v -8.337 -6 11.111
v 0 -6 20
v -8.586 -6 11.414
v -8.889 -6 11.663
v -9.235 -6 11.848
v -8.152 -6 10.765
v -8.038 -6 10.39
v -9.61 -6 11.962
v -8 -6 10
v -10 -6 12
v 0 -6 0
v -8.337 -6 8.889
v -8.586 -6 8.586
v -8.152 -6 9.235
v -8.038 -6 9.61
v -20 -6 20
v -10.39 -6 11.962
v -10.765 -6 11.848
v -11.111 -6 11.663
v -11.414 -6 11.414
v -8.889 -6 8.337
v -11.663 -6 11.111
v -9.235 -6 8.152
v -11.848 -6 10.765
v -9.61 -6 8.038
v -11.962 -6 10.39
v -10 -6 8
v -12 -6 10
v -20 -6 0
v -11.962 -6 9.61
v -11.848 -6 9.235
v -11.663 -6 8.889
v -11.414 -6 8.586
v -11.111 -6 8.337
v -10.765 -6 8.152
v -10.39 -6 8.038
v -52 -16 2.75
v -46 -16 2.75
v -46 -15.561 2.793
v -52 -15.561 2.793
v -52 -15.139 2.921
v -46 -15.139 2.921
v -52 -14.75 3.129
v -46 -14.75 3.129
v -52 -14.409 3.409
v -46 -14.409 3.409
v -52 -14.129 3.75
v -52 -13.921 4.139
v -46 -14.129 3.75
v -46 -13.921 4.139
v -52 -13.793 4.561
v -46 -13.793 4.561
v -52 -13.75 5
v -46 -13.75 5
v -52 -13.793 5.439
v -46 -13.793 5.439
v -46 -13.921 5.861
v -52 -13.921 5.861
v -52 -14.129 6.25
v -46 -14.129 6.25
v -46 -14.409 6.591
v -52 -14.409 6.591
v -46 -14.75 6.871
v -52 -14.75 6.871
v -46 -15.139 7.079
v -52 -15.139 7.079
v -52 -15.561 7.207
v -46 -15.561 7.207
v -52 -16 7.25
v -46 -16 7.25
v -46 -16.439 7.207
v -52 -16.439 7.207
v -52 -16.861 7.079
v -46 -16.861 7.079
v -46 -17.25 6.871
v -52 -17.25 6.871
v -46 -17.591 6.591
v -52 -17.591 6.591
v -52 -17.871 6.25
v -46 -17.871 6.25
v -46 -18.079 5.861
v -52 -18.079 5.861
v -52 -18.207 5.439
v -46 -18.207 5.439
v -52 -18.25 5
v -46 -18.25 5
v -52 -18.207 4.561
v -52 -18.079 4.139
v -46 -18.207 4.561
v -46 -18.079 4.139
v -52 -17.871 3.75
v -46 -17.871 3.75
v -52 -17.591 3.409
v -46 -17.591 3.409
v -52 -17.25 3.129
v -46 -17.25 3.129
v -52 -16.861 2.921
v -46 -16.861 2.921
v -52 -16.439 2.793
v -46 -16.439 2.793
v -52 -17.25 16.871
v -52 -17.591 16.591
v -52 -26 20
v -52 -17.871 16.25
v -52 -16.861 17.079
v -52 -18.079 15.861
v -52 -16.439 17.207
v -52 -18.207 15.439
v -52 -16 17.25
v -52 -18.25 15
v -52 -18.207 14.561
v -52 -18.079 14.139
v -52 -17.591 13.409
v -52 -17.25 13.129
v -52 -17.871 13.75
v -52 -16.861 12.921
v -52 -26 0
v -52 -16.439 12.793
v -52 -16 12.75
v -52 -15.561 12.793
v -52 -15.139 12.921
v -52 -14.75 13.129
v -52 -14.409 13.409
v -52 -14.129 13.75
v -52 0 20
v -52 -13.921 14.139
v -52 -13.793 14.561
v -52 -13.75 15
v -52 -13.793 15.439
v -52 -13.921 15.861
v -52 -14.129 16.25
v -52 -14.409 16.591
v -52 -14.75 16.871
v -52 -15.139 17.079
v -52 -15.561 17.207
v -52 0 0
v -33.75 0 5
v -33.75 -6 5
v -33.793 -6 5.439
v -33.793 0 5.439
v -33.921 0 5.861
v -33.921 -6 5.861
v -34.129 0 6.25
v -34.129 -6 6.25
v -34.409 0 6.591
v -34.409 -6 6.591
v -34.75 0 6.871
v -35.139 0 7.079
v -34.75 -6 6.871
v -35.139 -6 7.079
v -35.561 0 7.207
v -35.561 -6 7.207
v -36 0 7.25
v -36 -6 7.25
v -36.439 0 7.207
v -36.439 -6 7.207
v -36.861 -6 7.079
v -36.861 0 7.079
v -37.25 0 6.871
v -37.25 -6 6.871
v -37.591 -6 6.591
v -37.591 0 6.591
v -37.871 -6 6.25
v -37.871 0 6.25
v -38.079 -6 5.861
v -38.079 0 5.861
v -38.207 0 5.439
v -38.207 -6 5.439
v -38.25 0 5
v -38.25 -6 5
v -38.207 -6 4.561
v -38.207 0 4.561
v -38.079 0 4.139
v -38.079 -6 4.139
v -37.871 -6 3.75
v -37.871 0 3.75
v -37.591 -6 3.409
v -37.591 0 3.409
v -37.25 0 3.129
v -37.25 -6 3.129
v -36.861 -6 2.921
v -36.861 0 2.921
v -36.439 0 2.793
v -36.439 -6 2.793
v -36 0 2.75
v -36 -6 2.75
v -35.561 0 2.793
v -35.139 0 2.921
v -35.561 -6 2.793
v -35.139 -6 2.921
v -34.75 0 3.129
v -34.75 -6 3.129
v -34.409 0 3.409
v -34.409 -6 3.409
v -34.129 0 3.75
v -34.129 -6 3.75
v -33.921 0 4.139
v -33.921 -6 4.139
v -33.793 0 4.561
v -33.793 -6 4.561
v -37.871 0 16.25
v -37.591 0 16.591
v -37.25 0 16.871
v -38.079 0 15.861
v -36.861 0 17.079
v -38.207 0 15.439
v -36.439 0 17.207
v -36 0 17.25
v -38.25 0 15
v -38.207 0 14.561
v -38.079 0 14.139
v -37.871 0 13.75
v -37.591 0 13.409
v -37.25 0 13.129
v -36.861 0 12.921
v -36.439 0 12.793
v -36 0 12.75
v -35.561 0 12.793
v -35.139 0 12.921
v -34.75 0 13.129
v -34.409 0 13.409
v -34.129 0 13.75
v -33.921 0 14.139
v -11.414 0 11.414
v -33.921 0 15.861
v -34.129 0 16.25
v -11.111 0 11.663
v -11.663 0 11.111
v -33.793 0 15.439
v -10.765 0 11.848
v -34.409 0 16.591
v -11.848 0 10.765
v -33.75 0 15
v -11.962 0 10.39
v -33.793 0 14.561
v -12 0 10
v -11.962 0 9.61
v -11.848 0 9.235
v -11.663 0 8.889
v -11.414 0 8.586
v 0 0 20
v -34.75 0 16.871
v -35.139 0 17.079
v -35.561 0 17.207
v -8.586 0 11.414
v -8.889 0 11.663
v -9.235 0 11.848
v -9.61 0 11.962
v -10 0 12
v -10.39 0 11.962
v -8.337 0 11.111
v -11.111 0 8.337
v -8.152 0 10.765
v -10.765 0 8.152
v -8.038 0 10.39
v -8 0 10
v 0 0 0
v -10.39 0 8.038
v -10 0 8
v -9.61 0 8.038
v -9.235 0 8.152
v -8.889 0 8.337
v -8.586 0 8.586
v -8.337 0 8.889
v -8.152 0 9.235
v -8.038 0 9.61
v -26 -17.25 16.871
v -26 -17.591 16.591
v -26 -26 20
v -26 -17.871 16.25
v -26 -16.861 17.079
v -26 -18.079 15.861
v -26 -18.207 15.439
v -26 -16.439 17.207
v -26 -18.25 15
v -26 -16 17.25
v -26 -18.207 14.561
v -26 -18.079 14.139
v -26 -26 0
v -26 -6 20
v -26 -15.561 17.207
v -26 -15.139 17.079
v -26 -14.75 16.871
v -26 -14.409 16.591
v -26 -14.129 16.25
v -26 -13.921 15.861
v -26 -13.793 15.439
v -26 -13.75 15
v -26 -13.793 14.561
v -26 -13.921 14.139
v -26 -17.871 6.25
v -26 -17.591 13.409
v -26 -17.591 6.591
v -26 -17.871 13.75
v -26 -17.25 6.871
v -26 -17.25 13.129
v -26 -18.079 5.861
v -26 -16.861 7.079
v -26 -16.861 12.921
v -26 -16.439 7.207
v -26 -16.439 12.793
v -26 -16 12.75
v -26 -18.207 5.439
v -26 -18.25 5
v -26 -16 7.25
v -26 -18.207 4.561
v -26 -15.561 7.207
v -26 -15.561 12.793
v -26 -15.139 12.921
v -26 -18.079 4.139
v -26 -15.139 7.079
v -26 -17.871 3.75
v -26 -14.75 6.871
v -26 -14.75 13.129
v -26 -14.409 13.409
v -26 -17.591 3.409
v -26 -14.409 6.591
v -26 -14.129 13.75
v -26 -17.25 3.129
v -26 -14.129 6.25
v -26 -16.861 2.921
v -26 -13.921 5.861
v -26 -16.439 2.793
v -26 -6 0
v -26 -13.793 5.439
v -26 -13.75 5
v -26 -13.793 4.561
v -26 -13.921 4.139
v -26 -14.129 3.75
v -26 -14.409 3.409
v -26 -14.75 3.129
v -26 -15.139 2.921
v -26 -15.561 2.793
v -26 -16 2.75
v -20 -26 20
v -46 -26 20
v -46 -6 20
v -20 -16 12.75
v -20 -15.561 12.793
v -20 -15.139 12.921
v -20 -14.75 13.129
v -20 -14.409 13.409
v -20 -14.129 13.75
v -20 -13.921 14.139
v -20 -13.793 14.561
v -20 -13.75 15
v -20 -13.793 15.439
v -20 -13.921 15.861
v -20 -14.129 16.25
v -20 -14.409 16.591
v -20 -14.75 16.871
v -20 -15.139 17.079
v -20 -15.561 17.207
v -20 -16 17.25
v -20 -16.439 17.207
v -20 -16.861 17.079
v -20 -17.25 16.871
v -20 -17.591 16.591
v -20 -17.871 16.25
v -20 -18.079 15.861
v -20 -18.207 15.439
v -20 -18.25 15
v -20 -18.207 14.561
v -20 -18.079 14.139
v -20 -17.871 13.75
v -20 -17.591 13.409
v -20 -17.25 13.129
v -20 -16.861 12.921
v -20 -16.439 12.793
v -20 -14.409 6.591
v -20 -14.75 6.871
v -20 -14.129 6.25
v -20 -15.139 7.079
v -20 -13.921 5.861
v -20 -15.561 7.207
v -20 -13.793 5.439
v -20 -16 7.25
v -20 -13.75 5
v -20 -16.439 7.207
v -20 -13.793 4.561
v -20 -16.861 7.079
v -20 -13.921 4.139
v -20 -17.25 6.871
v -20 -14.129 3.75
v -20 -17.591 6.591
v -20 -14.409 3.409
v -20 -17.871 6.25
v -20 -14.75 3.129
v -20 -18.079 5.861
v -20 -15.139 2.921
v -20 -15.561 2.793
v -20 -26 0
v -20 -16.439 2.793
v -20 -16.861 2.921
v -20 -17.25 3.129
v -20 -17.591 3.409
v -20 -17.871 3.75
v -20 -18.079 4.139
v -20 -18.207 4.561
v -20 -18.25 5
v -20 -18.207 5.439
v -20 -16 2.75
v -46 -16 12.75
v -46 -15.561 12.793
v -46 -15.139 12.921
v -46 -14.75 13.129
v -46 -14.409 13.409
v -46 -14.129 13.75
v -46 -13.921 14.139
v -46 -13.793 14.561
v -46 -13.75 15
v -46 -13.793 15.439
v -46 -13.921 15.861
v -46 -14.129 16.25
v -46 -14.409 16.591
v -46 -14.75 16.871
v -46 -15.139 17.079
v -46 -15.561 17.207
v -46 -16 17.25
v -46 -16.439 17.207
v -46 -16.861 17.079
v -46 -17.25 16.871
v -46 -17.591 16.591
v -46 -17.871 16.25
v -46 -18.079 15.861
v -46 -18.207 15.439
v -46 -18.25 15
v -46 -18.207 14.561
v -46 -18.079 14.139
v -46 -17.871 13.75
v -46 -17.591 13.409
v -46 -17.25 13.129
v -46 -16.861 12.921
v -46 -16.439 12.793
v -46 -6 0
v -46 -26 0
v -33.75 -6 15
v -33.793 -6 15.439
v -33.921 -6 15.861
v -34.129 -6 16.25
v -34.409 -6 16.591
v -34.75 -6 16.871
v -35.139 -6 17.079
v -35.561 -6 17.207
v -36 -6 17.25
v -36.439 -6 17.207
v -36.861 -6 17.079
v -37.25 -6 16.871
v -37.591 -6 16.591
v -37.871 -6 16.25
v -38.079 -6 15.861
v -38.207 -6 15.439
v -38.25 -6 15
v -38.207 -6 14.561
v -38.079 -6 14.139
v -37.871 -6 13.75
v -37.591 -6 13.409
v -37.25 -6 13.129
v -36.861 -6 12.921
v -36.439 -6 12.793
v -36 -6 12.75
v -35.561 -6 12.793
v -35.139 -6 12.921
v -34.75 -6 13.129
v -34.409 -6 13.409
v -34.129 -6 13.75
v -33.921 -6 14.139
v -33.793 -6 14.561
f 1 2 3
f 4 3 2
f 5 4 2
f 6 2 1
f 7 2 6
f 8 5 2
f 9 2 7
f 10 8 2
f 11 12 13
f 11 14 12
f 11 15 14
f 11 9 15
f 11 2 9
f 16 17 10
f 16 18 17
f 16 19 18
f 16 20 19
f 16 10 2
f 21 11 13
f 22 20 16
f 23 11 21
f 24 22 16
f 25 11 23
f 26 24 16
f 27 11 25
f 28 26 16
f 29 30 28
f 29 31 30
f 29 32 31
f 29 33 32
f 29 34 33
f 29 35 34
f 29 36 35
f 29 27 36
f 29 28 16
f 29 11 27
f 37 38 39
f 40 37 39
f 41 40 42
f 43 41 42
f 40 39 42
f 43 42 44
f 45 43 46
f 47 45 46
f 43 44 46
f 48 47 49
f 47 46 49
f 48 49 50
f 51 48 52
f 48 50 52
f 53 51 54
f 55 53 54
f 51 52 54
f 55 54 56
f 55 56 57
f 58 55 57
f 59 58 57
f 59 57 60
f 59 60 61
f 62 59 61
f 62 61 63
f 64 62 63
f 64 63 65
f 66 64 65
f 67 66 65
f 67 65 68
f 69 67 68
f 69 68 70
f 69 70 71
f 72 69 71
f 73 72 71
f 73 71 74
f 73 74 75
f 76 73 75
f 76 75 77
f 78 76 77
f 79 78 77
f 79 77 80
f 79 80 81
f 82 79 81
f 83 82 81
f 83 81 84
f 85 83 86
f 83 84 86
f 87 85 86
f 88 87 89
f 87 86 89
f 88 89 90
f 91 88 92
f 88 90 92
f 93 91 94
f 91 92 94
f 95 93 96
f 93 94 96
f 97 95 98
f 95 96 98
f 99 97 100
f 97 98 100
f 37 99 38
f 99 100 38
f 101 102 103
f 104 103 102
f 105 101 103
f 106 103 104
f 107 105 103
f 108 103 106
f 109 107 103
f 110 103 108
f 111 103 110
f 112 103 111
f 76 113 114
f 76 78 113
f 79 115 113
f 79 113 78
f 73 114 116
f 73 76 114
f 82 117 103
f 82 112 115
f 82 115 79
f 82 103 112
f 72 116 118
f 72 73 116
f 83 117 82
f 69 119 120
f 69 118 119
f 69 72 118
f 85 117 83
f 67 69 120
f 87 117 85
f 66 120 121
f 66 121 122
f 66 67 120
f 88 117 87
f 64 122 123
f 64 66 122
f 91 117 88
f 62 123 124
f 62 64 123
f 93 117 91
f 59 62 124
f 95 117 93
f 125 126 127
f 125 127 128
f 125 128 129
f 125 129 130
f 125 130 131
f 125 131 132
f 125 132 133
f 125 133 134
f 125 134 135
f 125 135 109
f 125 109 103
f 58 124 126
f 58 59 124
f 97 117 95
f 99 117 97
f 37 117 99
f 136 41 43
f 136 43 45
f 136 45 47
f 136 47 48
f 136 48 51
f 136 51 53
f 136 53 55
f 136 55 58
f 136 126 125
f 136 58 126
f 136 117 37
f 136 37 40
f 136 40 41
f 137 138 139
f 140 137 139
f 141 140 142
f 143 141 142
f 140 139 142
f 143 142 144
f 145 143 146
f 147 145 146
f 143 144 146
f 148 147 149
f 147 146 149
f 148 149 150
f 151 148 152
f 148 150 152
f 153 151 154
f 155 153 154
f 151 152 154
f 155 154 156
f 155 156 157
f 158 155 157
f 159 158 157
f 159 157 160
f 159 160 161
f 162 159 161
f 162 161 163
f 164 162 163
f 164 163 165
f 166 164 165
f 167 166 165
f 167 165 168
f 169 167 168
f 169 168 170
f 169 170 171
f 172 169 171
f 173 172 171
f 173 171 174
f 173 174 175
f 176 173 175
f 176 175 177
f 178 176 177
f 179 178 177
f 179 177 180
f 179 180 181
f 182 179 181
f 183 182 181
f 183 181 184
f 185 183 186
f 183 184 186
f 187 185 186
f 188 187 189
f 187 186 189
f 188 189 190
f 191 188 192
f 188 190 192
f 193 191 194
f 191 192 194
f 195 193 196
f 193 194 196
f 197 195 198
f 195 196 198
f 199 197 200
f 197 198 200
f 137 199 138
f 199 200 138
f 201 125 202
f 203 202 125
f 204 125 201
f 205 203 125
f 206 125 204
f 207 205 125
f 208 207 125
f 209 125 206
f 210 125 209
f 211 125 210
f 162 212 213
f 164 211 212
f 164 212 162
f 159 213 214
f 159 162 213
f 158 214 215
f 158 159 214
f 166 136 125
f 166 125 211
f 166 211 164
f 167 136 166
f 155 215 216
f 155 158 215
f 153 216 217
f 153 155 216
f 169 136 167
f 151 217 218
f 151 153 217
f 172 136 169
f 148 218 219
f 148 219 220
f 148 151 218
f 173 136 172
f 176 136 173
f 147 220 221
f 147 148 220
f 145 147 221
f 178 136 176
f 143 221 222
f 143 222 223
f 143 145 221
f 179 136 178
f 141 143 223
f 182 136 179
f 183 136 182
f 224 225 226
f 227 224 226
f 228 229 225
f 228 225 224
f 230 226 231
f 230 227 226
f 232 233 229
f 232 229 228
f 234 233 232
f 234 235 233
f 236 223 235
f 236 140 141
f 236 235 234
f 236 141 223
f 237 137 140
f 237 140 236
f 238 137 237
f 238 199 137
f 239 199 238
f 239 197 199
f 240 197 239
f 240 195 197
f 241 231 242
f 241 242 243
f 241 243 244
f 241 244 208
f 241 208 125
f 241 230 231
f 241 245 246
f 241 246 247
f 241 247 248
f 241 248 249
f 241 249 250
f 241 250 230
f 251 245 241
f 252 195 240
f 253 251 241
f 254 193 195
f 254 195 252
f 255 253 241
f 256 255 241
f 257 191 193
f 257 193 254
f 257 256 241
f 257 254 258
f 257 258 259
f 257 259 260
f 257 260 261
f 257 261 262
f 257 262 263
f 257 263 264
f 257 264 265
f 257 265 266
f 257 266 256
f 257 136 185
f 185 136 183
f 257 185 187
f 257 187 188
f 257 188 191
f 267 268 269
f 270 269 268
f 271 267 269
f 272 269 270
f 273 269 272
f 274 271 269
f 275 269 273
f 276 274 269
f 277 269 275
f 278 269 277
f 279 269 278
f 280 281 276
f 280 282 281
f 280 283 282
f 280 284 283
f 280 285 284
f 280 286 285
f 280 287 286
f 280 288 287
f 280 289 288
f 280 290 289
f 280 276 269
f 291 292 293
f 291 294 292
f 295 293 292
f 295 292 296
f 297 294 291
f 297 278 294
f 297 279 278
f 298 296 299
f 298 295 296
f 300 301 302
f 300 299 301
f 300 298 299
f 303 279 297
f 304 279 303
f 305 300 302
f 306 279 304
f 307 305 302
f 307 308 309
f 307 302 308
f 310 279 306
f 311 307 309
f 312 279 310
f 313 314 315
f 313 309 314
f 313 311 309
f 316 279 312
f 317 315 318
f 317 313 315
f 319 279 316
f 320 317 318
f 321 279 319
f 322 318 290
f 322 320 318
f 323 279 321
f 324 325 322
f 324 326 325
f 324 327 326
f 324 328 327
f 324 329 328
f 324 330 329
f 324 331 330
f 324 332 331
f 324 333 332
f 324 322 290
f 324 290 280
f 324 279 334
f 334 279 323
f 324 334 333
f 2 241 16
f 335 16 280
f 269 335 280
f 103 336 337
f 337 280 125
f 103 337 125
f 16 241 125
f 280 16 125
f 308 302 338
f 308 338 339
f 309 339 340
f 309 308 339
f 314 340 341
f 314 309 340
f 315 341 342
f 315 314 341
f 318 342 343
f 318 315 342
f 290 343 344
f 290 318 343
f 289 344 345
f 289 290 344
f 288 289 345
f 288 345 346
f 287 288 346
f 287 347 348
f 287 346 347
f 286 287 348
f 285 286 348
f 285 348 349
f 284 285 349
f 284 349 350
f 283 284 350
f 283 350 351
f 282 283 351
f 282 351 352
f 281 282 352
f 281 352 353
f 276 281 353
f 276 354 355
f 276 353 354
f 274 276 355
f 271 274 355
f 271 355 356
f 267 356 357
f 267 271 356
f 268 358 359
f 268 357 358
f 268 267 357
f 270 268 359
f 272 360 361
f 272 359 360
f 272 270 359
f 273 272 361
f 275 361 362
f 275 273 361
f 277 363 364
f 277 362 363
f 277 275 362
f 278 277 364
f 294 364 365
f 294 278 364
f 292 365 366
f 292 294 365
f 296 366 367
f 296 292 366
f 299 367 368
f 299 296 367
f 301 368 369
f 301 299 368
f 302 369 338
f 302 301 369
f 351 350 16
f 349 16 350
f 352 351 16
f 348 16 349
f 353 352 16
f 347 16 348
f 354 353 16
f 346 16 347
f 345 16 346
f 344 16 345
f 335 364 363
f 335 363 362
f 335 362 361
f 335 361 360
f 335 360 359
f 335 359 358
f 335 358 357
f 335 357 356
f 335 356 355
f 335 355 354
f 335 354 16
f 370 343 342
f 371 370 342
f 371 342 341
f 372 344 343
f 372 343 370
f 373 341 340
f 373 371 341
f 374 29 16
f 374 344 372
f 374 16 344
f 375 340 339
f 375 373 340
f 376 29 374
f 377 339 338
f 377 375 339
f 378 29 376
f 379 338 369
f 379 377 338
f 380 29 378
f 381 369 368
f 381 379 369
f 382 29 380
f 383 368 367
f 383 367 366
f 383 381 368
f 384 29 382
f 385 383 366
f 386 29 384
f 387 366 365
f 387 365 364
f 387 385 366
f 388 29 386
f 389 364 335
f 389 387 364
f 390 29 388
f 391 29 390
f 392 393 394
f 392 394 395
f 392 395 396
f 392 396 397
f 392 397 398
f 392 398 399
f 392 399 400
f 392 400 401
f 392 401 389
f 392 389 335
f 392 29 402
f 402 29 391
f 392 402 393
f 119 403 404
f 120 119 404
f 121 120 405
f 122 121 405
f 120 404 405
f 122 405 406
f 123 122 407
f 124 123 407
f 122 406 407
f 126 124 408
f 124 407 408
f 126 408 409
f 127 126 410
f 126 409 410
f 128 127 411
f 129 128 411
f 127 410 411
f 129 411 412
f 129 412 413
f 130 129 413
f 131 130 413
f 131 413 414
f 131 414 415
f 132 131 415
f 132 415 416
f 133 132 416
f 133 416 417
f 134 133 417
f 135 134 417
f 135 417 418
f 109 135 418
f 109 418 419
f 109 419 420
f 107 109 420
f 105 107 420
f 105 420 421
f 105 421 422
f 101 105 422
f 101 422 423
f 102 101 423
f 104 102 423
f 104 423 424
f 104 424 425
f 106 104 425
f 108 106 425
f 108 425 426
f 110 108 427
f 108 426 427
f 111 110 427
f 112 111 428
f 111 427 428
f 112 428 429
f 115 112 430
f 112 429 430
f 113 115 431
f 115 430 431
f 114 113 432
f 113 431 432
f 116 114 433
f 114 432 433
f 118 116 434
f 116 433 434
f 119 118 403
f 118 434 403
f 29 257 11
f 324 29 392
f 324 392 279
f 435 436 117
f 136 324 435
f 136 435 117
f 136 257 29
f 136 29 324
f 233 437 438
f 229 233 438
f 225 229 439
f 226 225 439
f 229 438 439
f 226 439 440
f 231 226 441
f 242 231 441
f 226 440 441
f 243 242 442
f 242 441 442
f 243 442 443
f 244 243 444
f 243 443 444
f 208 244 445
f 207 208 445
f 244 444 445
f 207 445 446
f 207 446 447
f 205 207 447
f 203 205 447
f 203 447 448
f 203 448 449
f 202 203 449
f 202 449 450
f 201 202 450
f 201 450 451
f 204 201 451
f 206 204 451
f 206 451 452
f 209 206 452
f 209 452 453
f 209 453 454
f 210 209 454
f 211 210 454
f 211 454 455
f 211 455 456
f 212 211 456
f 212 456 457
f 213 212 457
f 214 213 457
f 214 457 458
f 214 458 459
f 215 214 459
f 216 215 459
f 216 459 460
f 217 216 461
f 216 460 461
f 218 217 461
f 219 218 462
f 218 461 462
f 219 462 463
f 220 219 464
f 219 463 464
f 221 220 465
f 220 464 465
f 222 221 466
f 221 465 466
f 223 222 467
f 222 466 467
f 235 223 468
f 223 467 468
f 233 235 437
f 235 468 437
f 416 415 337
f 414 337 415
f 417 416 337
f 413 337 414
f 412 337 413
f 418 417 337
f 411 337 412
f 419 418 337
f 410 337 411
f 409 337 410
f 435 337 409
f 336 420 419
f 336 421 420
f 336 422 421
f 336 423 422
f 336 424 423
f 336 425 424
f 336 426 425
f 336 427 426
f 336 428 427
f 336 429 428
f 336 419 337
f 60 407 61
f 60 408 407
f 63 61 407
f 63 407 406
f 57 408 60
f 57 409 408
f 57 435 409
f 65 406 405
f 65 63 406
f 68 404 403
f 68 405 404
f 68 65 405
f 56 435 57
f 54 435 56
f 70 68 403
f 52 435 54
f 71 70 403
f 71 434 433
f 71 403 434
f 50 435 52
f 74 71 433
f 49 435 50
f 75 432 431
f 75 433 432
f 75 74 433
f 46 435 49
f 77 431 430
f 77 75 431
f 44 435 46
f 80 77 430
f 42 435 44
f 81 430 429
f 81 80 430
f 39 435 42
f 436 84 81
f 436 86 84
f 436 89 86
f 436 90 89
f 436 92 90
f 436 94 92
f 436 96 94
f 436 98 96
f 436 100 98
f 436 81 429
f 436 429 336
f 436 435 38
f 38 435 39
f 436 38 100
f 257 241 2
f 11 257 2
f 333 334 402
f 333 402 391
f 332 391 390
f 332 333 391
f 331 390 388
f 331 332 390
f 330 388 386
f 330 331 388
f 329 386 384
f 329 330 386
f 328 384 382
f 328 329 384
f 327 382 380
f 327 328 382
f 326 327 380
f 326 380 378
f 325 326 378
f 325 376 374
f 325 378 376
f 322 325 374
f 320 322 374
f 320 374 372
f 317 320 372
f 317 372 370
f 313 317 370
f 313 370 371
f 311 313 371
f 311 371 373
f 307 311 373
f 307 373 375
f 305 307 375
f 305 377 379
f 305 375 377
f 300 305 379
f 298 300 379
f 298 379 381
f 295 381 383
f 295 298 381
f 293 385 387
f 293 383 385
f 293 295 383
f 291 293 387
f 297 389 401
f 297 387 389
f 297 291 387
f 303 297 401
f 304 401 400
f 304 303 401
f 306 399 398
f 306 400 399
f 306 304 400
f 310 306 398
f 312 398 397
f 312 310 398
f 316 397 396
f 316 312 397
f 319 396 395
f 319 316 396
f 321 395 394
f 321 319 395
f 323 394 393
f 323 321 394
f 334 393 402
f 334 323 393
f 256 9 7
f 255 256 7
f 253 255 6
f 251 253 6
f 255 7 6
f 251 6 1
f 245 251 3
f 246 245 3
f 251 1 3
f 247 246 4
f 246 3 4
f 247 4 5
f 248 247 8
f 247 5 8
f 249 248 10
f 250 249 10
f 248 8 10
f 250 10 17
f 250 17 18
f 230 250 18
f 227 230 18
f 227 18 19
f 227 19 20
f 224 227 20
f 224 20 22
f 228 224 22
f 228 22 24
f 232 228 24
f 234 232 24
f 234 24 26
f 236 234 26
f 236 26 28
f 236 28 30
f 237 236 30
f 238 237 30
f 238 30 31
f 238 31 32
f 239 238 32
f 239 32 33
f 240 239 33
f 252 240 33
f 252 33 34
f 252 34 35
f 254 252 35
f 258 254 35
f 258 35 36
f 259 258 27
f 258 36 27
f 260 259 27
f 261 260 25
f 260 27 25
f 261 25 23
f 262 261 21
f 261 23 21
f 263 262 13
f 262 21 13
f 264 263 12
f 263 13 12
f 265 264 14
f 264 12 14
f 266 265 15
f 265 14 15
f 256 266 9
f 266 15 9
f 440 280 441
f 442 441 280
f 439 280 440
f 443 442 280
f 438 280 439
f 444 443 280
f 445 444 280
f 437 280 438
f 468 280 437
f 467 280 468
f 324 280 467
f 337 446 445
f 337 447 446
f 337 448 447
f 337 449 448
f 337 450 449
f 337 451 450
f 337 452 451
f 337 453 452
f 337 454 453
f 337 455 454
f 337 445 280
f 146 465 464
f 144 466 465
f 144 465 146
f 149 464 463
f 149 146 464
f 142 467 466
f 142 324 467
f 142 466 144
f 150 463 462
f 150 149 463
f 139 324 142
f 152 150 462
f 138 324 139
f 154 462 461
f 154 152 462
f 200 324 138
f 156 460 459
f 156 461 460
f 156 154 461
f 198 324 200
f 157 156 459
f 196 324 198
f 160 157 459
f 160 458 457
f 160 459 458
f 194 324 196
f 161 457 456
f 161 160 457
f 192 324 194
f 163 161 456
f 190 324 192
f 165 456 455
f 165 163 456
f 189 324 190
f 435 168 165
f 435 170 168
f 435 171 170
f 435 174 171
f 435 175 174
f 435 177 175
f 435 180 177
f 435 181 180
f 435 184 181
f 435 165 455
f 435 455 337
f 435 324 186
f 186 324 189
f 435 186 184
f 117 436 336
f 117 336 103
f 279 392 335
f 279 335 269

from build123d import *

# Parameters (mm, degrees)
BOSS_EXTRUDE3_DEPTH     = 20
SKETCH9_R               = 2.25
CUT_EXTRUDE1_DEPTH      = 47
CUT_EXTRUDE1_DEPTH_BACK = 7
SKETCH10_R              = 2.25
CUT_EXTRUDE2_DEPTH      = 21
CUT_EXTRUDE2_DEPTH_BACK = 7
SKETCH11_R              = 2
CUT_EXTRUDE3_DEPTH      = 21
CUT_EXTRUDE3_DEPTH_BACK = 7


with BuildPart() as part:
    # Sketch7 → Boss-Extrude3 (new body)
    with BuildSketch(Plane.XY):
        Polygon((-52, -26), (-52, 0), (0, 0), (0, -6), (-20, -6), (-20, -26), (-26, -26), (-26, -6), (-46, -6), (-46, -26), align=None)
    extrude(amount=BOSS_EXTRUDE3_DEPTH)

    # Sketch9 → Cut-Extrude1 (cut, two sides)
    with BuildSketch(Plane(origin=(-46, 0, 0), x_dir=(0, 0, -1), z_dir=(1, 0, 0))) as cut_extrude1_sk:
        with Locations((-15, -16)):
            Circle(SKETCH9_R)
        with Locations((-5, -16)):
            Circle(SKETCH9_R)
    extrude(amount=CUT_EXTRUDE1_DEPTH, mode=Mode.SUBTRACT)
    extrude(cut_extrude1_sk.sketch, amount=-CUT_EXTRUDE1_DEPTH_BACK, mode=Mode.SUBTRACT)

    # Sketch10 → Cut-Extrude2 (cut, two sides)
    with BuildSketch(Plane.XZ.offset(6)) as cut_extrude2_sk:
        with Locations((-36, 5)):
            Circle(SKETCH10_R)
        with Locations((-36, 15)):
            Circle(SKETCH10_R)
    extrude(amount=CUT_EXTRUDE2_DEPTH, mode=Mode.SUBTRACT)
    extrude(cut_extrude2_sk.sketch, amount=-CUT_EXTRUDE2_DEPTH_BACK, mode=Mode.SUBTRACT)

    # Sketch11 → Cut-Extrude3 (cut, two sides)
    with BuildSketch(Plane.XZ.offset(6)) as cut_extrude3_sk:
        with Locations((-10, 10)):
            Circle(SKETCH11_R)
    extrude(amount=CUT_EXTRUDE3_DEPTH, mode=Mode.SUBTRACT)
    extrude(cut_extrude3_sk.sketch, amount=-CUT_EXTRUDE3_DEPTH_BACK, mode=Mode.SUBTRACT)


solid = part.part
